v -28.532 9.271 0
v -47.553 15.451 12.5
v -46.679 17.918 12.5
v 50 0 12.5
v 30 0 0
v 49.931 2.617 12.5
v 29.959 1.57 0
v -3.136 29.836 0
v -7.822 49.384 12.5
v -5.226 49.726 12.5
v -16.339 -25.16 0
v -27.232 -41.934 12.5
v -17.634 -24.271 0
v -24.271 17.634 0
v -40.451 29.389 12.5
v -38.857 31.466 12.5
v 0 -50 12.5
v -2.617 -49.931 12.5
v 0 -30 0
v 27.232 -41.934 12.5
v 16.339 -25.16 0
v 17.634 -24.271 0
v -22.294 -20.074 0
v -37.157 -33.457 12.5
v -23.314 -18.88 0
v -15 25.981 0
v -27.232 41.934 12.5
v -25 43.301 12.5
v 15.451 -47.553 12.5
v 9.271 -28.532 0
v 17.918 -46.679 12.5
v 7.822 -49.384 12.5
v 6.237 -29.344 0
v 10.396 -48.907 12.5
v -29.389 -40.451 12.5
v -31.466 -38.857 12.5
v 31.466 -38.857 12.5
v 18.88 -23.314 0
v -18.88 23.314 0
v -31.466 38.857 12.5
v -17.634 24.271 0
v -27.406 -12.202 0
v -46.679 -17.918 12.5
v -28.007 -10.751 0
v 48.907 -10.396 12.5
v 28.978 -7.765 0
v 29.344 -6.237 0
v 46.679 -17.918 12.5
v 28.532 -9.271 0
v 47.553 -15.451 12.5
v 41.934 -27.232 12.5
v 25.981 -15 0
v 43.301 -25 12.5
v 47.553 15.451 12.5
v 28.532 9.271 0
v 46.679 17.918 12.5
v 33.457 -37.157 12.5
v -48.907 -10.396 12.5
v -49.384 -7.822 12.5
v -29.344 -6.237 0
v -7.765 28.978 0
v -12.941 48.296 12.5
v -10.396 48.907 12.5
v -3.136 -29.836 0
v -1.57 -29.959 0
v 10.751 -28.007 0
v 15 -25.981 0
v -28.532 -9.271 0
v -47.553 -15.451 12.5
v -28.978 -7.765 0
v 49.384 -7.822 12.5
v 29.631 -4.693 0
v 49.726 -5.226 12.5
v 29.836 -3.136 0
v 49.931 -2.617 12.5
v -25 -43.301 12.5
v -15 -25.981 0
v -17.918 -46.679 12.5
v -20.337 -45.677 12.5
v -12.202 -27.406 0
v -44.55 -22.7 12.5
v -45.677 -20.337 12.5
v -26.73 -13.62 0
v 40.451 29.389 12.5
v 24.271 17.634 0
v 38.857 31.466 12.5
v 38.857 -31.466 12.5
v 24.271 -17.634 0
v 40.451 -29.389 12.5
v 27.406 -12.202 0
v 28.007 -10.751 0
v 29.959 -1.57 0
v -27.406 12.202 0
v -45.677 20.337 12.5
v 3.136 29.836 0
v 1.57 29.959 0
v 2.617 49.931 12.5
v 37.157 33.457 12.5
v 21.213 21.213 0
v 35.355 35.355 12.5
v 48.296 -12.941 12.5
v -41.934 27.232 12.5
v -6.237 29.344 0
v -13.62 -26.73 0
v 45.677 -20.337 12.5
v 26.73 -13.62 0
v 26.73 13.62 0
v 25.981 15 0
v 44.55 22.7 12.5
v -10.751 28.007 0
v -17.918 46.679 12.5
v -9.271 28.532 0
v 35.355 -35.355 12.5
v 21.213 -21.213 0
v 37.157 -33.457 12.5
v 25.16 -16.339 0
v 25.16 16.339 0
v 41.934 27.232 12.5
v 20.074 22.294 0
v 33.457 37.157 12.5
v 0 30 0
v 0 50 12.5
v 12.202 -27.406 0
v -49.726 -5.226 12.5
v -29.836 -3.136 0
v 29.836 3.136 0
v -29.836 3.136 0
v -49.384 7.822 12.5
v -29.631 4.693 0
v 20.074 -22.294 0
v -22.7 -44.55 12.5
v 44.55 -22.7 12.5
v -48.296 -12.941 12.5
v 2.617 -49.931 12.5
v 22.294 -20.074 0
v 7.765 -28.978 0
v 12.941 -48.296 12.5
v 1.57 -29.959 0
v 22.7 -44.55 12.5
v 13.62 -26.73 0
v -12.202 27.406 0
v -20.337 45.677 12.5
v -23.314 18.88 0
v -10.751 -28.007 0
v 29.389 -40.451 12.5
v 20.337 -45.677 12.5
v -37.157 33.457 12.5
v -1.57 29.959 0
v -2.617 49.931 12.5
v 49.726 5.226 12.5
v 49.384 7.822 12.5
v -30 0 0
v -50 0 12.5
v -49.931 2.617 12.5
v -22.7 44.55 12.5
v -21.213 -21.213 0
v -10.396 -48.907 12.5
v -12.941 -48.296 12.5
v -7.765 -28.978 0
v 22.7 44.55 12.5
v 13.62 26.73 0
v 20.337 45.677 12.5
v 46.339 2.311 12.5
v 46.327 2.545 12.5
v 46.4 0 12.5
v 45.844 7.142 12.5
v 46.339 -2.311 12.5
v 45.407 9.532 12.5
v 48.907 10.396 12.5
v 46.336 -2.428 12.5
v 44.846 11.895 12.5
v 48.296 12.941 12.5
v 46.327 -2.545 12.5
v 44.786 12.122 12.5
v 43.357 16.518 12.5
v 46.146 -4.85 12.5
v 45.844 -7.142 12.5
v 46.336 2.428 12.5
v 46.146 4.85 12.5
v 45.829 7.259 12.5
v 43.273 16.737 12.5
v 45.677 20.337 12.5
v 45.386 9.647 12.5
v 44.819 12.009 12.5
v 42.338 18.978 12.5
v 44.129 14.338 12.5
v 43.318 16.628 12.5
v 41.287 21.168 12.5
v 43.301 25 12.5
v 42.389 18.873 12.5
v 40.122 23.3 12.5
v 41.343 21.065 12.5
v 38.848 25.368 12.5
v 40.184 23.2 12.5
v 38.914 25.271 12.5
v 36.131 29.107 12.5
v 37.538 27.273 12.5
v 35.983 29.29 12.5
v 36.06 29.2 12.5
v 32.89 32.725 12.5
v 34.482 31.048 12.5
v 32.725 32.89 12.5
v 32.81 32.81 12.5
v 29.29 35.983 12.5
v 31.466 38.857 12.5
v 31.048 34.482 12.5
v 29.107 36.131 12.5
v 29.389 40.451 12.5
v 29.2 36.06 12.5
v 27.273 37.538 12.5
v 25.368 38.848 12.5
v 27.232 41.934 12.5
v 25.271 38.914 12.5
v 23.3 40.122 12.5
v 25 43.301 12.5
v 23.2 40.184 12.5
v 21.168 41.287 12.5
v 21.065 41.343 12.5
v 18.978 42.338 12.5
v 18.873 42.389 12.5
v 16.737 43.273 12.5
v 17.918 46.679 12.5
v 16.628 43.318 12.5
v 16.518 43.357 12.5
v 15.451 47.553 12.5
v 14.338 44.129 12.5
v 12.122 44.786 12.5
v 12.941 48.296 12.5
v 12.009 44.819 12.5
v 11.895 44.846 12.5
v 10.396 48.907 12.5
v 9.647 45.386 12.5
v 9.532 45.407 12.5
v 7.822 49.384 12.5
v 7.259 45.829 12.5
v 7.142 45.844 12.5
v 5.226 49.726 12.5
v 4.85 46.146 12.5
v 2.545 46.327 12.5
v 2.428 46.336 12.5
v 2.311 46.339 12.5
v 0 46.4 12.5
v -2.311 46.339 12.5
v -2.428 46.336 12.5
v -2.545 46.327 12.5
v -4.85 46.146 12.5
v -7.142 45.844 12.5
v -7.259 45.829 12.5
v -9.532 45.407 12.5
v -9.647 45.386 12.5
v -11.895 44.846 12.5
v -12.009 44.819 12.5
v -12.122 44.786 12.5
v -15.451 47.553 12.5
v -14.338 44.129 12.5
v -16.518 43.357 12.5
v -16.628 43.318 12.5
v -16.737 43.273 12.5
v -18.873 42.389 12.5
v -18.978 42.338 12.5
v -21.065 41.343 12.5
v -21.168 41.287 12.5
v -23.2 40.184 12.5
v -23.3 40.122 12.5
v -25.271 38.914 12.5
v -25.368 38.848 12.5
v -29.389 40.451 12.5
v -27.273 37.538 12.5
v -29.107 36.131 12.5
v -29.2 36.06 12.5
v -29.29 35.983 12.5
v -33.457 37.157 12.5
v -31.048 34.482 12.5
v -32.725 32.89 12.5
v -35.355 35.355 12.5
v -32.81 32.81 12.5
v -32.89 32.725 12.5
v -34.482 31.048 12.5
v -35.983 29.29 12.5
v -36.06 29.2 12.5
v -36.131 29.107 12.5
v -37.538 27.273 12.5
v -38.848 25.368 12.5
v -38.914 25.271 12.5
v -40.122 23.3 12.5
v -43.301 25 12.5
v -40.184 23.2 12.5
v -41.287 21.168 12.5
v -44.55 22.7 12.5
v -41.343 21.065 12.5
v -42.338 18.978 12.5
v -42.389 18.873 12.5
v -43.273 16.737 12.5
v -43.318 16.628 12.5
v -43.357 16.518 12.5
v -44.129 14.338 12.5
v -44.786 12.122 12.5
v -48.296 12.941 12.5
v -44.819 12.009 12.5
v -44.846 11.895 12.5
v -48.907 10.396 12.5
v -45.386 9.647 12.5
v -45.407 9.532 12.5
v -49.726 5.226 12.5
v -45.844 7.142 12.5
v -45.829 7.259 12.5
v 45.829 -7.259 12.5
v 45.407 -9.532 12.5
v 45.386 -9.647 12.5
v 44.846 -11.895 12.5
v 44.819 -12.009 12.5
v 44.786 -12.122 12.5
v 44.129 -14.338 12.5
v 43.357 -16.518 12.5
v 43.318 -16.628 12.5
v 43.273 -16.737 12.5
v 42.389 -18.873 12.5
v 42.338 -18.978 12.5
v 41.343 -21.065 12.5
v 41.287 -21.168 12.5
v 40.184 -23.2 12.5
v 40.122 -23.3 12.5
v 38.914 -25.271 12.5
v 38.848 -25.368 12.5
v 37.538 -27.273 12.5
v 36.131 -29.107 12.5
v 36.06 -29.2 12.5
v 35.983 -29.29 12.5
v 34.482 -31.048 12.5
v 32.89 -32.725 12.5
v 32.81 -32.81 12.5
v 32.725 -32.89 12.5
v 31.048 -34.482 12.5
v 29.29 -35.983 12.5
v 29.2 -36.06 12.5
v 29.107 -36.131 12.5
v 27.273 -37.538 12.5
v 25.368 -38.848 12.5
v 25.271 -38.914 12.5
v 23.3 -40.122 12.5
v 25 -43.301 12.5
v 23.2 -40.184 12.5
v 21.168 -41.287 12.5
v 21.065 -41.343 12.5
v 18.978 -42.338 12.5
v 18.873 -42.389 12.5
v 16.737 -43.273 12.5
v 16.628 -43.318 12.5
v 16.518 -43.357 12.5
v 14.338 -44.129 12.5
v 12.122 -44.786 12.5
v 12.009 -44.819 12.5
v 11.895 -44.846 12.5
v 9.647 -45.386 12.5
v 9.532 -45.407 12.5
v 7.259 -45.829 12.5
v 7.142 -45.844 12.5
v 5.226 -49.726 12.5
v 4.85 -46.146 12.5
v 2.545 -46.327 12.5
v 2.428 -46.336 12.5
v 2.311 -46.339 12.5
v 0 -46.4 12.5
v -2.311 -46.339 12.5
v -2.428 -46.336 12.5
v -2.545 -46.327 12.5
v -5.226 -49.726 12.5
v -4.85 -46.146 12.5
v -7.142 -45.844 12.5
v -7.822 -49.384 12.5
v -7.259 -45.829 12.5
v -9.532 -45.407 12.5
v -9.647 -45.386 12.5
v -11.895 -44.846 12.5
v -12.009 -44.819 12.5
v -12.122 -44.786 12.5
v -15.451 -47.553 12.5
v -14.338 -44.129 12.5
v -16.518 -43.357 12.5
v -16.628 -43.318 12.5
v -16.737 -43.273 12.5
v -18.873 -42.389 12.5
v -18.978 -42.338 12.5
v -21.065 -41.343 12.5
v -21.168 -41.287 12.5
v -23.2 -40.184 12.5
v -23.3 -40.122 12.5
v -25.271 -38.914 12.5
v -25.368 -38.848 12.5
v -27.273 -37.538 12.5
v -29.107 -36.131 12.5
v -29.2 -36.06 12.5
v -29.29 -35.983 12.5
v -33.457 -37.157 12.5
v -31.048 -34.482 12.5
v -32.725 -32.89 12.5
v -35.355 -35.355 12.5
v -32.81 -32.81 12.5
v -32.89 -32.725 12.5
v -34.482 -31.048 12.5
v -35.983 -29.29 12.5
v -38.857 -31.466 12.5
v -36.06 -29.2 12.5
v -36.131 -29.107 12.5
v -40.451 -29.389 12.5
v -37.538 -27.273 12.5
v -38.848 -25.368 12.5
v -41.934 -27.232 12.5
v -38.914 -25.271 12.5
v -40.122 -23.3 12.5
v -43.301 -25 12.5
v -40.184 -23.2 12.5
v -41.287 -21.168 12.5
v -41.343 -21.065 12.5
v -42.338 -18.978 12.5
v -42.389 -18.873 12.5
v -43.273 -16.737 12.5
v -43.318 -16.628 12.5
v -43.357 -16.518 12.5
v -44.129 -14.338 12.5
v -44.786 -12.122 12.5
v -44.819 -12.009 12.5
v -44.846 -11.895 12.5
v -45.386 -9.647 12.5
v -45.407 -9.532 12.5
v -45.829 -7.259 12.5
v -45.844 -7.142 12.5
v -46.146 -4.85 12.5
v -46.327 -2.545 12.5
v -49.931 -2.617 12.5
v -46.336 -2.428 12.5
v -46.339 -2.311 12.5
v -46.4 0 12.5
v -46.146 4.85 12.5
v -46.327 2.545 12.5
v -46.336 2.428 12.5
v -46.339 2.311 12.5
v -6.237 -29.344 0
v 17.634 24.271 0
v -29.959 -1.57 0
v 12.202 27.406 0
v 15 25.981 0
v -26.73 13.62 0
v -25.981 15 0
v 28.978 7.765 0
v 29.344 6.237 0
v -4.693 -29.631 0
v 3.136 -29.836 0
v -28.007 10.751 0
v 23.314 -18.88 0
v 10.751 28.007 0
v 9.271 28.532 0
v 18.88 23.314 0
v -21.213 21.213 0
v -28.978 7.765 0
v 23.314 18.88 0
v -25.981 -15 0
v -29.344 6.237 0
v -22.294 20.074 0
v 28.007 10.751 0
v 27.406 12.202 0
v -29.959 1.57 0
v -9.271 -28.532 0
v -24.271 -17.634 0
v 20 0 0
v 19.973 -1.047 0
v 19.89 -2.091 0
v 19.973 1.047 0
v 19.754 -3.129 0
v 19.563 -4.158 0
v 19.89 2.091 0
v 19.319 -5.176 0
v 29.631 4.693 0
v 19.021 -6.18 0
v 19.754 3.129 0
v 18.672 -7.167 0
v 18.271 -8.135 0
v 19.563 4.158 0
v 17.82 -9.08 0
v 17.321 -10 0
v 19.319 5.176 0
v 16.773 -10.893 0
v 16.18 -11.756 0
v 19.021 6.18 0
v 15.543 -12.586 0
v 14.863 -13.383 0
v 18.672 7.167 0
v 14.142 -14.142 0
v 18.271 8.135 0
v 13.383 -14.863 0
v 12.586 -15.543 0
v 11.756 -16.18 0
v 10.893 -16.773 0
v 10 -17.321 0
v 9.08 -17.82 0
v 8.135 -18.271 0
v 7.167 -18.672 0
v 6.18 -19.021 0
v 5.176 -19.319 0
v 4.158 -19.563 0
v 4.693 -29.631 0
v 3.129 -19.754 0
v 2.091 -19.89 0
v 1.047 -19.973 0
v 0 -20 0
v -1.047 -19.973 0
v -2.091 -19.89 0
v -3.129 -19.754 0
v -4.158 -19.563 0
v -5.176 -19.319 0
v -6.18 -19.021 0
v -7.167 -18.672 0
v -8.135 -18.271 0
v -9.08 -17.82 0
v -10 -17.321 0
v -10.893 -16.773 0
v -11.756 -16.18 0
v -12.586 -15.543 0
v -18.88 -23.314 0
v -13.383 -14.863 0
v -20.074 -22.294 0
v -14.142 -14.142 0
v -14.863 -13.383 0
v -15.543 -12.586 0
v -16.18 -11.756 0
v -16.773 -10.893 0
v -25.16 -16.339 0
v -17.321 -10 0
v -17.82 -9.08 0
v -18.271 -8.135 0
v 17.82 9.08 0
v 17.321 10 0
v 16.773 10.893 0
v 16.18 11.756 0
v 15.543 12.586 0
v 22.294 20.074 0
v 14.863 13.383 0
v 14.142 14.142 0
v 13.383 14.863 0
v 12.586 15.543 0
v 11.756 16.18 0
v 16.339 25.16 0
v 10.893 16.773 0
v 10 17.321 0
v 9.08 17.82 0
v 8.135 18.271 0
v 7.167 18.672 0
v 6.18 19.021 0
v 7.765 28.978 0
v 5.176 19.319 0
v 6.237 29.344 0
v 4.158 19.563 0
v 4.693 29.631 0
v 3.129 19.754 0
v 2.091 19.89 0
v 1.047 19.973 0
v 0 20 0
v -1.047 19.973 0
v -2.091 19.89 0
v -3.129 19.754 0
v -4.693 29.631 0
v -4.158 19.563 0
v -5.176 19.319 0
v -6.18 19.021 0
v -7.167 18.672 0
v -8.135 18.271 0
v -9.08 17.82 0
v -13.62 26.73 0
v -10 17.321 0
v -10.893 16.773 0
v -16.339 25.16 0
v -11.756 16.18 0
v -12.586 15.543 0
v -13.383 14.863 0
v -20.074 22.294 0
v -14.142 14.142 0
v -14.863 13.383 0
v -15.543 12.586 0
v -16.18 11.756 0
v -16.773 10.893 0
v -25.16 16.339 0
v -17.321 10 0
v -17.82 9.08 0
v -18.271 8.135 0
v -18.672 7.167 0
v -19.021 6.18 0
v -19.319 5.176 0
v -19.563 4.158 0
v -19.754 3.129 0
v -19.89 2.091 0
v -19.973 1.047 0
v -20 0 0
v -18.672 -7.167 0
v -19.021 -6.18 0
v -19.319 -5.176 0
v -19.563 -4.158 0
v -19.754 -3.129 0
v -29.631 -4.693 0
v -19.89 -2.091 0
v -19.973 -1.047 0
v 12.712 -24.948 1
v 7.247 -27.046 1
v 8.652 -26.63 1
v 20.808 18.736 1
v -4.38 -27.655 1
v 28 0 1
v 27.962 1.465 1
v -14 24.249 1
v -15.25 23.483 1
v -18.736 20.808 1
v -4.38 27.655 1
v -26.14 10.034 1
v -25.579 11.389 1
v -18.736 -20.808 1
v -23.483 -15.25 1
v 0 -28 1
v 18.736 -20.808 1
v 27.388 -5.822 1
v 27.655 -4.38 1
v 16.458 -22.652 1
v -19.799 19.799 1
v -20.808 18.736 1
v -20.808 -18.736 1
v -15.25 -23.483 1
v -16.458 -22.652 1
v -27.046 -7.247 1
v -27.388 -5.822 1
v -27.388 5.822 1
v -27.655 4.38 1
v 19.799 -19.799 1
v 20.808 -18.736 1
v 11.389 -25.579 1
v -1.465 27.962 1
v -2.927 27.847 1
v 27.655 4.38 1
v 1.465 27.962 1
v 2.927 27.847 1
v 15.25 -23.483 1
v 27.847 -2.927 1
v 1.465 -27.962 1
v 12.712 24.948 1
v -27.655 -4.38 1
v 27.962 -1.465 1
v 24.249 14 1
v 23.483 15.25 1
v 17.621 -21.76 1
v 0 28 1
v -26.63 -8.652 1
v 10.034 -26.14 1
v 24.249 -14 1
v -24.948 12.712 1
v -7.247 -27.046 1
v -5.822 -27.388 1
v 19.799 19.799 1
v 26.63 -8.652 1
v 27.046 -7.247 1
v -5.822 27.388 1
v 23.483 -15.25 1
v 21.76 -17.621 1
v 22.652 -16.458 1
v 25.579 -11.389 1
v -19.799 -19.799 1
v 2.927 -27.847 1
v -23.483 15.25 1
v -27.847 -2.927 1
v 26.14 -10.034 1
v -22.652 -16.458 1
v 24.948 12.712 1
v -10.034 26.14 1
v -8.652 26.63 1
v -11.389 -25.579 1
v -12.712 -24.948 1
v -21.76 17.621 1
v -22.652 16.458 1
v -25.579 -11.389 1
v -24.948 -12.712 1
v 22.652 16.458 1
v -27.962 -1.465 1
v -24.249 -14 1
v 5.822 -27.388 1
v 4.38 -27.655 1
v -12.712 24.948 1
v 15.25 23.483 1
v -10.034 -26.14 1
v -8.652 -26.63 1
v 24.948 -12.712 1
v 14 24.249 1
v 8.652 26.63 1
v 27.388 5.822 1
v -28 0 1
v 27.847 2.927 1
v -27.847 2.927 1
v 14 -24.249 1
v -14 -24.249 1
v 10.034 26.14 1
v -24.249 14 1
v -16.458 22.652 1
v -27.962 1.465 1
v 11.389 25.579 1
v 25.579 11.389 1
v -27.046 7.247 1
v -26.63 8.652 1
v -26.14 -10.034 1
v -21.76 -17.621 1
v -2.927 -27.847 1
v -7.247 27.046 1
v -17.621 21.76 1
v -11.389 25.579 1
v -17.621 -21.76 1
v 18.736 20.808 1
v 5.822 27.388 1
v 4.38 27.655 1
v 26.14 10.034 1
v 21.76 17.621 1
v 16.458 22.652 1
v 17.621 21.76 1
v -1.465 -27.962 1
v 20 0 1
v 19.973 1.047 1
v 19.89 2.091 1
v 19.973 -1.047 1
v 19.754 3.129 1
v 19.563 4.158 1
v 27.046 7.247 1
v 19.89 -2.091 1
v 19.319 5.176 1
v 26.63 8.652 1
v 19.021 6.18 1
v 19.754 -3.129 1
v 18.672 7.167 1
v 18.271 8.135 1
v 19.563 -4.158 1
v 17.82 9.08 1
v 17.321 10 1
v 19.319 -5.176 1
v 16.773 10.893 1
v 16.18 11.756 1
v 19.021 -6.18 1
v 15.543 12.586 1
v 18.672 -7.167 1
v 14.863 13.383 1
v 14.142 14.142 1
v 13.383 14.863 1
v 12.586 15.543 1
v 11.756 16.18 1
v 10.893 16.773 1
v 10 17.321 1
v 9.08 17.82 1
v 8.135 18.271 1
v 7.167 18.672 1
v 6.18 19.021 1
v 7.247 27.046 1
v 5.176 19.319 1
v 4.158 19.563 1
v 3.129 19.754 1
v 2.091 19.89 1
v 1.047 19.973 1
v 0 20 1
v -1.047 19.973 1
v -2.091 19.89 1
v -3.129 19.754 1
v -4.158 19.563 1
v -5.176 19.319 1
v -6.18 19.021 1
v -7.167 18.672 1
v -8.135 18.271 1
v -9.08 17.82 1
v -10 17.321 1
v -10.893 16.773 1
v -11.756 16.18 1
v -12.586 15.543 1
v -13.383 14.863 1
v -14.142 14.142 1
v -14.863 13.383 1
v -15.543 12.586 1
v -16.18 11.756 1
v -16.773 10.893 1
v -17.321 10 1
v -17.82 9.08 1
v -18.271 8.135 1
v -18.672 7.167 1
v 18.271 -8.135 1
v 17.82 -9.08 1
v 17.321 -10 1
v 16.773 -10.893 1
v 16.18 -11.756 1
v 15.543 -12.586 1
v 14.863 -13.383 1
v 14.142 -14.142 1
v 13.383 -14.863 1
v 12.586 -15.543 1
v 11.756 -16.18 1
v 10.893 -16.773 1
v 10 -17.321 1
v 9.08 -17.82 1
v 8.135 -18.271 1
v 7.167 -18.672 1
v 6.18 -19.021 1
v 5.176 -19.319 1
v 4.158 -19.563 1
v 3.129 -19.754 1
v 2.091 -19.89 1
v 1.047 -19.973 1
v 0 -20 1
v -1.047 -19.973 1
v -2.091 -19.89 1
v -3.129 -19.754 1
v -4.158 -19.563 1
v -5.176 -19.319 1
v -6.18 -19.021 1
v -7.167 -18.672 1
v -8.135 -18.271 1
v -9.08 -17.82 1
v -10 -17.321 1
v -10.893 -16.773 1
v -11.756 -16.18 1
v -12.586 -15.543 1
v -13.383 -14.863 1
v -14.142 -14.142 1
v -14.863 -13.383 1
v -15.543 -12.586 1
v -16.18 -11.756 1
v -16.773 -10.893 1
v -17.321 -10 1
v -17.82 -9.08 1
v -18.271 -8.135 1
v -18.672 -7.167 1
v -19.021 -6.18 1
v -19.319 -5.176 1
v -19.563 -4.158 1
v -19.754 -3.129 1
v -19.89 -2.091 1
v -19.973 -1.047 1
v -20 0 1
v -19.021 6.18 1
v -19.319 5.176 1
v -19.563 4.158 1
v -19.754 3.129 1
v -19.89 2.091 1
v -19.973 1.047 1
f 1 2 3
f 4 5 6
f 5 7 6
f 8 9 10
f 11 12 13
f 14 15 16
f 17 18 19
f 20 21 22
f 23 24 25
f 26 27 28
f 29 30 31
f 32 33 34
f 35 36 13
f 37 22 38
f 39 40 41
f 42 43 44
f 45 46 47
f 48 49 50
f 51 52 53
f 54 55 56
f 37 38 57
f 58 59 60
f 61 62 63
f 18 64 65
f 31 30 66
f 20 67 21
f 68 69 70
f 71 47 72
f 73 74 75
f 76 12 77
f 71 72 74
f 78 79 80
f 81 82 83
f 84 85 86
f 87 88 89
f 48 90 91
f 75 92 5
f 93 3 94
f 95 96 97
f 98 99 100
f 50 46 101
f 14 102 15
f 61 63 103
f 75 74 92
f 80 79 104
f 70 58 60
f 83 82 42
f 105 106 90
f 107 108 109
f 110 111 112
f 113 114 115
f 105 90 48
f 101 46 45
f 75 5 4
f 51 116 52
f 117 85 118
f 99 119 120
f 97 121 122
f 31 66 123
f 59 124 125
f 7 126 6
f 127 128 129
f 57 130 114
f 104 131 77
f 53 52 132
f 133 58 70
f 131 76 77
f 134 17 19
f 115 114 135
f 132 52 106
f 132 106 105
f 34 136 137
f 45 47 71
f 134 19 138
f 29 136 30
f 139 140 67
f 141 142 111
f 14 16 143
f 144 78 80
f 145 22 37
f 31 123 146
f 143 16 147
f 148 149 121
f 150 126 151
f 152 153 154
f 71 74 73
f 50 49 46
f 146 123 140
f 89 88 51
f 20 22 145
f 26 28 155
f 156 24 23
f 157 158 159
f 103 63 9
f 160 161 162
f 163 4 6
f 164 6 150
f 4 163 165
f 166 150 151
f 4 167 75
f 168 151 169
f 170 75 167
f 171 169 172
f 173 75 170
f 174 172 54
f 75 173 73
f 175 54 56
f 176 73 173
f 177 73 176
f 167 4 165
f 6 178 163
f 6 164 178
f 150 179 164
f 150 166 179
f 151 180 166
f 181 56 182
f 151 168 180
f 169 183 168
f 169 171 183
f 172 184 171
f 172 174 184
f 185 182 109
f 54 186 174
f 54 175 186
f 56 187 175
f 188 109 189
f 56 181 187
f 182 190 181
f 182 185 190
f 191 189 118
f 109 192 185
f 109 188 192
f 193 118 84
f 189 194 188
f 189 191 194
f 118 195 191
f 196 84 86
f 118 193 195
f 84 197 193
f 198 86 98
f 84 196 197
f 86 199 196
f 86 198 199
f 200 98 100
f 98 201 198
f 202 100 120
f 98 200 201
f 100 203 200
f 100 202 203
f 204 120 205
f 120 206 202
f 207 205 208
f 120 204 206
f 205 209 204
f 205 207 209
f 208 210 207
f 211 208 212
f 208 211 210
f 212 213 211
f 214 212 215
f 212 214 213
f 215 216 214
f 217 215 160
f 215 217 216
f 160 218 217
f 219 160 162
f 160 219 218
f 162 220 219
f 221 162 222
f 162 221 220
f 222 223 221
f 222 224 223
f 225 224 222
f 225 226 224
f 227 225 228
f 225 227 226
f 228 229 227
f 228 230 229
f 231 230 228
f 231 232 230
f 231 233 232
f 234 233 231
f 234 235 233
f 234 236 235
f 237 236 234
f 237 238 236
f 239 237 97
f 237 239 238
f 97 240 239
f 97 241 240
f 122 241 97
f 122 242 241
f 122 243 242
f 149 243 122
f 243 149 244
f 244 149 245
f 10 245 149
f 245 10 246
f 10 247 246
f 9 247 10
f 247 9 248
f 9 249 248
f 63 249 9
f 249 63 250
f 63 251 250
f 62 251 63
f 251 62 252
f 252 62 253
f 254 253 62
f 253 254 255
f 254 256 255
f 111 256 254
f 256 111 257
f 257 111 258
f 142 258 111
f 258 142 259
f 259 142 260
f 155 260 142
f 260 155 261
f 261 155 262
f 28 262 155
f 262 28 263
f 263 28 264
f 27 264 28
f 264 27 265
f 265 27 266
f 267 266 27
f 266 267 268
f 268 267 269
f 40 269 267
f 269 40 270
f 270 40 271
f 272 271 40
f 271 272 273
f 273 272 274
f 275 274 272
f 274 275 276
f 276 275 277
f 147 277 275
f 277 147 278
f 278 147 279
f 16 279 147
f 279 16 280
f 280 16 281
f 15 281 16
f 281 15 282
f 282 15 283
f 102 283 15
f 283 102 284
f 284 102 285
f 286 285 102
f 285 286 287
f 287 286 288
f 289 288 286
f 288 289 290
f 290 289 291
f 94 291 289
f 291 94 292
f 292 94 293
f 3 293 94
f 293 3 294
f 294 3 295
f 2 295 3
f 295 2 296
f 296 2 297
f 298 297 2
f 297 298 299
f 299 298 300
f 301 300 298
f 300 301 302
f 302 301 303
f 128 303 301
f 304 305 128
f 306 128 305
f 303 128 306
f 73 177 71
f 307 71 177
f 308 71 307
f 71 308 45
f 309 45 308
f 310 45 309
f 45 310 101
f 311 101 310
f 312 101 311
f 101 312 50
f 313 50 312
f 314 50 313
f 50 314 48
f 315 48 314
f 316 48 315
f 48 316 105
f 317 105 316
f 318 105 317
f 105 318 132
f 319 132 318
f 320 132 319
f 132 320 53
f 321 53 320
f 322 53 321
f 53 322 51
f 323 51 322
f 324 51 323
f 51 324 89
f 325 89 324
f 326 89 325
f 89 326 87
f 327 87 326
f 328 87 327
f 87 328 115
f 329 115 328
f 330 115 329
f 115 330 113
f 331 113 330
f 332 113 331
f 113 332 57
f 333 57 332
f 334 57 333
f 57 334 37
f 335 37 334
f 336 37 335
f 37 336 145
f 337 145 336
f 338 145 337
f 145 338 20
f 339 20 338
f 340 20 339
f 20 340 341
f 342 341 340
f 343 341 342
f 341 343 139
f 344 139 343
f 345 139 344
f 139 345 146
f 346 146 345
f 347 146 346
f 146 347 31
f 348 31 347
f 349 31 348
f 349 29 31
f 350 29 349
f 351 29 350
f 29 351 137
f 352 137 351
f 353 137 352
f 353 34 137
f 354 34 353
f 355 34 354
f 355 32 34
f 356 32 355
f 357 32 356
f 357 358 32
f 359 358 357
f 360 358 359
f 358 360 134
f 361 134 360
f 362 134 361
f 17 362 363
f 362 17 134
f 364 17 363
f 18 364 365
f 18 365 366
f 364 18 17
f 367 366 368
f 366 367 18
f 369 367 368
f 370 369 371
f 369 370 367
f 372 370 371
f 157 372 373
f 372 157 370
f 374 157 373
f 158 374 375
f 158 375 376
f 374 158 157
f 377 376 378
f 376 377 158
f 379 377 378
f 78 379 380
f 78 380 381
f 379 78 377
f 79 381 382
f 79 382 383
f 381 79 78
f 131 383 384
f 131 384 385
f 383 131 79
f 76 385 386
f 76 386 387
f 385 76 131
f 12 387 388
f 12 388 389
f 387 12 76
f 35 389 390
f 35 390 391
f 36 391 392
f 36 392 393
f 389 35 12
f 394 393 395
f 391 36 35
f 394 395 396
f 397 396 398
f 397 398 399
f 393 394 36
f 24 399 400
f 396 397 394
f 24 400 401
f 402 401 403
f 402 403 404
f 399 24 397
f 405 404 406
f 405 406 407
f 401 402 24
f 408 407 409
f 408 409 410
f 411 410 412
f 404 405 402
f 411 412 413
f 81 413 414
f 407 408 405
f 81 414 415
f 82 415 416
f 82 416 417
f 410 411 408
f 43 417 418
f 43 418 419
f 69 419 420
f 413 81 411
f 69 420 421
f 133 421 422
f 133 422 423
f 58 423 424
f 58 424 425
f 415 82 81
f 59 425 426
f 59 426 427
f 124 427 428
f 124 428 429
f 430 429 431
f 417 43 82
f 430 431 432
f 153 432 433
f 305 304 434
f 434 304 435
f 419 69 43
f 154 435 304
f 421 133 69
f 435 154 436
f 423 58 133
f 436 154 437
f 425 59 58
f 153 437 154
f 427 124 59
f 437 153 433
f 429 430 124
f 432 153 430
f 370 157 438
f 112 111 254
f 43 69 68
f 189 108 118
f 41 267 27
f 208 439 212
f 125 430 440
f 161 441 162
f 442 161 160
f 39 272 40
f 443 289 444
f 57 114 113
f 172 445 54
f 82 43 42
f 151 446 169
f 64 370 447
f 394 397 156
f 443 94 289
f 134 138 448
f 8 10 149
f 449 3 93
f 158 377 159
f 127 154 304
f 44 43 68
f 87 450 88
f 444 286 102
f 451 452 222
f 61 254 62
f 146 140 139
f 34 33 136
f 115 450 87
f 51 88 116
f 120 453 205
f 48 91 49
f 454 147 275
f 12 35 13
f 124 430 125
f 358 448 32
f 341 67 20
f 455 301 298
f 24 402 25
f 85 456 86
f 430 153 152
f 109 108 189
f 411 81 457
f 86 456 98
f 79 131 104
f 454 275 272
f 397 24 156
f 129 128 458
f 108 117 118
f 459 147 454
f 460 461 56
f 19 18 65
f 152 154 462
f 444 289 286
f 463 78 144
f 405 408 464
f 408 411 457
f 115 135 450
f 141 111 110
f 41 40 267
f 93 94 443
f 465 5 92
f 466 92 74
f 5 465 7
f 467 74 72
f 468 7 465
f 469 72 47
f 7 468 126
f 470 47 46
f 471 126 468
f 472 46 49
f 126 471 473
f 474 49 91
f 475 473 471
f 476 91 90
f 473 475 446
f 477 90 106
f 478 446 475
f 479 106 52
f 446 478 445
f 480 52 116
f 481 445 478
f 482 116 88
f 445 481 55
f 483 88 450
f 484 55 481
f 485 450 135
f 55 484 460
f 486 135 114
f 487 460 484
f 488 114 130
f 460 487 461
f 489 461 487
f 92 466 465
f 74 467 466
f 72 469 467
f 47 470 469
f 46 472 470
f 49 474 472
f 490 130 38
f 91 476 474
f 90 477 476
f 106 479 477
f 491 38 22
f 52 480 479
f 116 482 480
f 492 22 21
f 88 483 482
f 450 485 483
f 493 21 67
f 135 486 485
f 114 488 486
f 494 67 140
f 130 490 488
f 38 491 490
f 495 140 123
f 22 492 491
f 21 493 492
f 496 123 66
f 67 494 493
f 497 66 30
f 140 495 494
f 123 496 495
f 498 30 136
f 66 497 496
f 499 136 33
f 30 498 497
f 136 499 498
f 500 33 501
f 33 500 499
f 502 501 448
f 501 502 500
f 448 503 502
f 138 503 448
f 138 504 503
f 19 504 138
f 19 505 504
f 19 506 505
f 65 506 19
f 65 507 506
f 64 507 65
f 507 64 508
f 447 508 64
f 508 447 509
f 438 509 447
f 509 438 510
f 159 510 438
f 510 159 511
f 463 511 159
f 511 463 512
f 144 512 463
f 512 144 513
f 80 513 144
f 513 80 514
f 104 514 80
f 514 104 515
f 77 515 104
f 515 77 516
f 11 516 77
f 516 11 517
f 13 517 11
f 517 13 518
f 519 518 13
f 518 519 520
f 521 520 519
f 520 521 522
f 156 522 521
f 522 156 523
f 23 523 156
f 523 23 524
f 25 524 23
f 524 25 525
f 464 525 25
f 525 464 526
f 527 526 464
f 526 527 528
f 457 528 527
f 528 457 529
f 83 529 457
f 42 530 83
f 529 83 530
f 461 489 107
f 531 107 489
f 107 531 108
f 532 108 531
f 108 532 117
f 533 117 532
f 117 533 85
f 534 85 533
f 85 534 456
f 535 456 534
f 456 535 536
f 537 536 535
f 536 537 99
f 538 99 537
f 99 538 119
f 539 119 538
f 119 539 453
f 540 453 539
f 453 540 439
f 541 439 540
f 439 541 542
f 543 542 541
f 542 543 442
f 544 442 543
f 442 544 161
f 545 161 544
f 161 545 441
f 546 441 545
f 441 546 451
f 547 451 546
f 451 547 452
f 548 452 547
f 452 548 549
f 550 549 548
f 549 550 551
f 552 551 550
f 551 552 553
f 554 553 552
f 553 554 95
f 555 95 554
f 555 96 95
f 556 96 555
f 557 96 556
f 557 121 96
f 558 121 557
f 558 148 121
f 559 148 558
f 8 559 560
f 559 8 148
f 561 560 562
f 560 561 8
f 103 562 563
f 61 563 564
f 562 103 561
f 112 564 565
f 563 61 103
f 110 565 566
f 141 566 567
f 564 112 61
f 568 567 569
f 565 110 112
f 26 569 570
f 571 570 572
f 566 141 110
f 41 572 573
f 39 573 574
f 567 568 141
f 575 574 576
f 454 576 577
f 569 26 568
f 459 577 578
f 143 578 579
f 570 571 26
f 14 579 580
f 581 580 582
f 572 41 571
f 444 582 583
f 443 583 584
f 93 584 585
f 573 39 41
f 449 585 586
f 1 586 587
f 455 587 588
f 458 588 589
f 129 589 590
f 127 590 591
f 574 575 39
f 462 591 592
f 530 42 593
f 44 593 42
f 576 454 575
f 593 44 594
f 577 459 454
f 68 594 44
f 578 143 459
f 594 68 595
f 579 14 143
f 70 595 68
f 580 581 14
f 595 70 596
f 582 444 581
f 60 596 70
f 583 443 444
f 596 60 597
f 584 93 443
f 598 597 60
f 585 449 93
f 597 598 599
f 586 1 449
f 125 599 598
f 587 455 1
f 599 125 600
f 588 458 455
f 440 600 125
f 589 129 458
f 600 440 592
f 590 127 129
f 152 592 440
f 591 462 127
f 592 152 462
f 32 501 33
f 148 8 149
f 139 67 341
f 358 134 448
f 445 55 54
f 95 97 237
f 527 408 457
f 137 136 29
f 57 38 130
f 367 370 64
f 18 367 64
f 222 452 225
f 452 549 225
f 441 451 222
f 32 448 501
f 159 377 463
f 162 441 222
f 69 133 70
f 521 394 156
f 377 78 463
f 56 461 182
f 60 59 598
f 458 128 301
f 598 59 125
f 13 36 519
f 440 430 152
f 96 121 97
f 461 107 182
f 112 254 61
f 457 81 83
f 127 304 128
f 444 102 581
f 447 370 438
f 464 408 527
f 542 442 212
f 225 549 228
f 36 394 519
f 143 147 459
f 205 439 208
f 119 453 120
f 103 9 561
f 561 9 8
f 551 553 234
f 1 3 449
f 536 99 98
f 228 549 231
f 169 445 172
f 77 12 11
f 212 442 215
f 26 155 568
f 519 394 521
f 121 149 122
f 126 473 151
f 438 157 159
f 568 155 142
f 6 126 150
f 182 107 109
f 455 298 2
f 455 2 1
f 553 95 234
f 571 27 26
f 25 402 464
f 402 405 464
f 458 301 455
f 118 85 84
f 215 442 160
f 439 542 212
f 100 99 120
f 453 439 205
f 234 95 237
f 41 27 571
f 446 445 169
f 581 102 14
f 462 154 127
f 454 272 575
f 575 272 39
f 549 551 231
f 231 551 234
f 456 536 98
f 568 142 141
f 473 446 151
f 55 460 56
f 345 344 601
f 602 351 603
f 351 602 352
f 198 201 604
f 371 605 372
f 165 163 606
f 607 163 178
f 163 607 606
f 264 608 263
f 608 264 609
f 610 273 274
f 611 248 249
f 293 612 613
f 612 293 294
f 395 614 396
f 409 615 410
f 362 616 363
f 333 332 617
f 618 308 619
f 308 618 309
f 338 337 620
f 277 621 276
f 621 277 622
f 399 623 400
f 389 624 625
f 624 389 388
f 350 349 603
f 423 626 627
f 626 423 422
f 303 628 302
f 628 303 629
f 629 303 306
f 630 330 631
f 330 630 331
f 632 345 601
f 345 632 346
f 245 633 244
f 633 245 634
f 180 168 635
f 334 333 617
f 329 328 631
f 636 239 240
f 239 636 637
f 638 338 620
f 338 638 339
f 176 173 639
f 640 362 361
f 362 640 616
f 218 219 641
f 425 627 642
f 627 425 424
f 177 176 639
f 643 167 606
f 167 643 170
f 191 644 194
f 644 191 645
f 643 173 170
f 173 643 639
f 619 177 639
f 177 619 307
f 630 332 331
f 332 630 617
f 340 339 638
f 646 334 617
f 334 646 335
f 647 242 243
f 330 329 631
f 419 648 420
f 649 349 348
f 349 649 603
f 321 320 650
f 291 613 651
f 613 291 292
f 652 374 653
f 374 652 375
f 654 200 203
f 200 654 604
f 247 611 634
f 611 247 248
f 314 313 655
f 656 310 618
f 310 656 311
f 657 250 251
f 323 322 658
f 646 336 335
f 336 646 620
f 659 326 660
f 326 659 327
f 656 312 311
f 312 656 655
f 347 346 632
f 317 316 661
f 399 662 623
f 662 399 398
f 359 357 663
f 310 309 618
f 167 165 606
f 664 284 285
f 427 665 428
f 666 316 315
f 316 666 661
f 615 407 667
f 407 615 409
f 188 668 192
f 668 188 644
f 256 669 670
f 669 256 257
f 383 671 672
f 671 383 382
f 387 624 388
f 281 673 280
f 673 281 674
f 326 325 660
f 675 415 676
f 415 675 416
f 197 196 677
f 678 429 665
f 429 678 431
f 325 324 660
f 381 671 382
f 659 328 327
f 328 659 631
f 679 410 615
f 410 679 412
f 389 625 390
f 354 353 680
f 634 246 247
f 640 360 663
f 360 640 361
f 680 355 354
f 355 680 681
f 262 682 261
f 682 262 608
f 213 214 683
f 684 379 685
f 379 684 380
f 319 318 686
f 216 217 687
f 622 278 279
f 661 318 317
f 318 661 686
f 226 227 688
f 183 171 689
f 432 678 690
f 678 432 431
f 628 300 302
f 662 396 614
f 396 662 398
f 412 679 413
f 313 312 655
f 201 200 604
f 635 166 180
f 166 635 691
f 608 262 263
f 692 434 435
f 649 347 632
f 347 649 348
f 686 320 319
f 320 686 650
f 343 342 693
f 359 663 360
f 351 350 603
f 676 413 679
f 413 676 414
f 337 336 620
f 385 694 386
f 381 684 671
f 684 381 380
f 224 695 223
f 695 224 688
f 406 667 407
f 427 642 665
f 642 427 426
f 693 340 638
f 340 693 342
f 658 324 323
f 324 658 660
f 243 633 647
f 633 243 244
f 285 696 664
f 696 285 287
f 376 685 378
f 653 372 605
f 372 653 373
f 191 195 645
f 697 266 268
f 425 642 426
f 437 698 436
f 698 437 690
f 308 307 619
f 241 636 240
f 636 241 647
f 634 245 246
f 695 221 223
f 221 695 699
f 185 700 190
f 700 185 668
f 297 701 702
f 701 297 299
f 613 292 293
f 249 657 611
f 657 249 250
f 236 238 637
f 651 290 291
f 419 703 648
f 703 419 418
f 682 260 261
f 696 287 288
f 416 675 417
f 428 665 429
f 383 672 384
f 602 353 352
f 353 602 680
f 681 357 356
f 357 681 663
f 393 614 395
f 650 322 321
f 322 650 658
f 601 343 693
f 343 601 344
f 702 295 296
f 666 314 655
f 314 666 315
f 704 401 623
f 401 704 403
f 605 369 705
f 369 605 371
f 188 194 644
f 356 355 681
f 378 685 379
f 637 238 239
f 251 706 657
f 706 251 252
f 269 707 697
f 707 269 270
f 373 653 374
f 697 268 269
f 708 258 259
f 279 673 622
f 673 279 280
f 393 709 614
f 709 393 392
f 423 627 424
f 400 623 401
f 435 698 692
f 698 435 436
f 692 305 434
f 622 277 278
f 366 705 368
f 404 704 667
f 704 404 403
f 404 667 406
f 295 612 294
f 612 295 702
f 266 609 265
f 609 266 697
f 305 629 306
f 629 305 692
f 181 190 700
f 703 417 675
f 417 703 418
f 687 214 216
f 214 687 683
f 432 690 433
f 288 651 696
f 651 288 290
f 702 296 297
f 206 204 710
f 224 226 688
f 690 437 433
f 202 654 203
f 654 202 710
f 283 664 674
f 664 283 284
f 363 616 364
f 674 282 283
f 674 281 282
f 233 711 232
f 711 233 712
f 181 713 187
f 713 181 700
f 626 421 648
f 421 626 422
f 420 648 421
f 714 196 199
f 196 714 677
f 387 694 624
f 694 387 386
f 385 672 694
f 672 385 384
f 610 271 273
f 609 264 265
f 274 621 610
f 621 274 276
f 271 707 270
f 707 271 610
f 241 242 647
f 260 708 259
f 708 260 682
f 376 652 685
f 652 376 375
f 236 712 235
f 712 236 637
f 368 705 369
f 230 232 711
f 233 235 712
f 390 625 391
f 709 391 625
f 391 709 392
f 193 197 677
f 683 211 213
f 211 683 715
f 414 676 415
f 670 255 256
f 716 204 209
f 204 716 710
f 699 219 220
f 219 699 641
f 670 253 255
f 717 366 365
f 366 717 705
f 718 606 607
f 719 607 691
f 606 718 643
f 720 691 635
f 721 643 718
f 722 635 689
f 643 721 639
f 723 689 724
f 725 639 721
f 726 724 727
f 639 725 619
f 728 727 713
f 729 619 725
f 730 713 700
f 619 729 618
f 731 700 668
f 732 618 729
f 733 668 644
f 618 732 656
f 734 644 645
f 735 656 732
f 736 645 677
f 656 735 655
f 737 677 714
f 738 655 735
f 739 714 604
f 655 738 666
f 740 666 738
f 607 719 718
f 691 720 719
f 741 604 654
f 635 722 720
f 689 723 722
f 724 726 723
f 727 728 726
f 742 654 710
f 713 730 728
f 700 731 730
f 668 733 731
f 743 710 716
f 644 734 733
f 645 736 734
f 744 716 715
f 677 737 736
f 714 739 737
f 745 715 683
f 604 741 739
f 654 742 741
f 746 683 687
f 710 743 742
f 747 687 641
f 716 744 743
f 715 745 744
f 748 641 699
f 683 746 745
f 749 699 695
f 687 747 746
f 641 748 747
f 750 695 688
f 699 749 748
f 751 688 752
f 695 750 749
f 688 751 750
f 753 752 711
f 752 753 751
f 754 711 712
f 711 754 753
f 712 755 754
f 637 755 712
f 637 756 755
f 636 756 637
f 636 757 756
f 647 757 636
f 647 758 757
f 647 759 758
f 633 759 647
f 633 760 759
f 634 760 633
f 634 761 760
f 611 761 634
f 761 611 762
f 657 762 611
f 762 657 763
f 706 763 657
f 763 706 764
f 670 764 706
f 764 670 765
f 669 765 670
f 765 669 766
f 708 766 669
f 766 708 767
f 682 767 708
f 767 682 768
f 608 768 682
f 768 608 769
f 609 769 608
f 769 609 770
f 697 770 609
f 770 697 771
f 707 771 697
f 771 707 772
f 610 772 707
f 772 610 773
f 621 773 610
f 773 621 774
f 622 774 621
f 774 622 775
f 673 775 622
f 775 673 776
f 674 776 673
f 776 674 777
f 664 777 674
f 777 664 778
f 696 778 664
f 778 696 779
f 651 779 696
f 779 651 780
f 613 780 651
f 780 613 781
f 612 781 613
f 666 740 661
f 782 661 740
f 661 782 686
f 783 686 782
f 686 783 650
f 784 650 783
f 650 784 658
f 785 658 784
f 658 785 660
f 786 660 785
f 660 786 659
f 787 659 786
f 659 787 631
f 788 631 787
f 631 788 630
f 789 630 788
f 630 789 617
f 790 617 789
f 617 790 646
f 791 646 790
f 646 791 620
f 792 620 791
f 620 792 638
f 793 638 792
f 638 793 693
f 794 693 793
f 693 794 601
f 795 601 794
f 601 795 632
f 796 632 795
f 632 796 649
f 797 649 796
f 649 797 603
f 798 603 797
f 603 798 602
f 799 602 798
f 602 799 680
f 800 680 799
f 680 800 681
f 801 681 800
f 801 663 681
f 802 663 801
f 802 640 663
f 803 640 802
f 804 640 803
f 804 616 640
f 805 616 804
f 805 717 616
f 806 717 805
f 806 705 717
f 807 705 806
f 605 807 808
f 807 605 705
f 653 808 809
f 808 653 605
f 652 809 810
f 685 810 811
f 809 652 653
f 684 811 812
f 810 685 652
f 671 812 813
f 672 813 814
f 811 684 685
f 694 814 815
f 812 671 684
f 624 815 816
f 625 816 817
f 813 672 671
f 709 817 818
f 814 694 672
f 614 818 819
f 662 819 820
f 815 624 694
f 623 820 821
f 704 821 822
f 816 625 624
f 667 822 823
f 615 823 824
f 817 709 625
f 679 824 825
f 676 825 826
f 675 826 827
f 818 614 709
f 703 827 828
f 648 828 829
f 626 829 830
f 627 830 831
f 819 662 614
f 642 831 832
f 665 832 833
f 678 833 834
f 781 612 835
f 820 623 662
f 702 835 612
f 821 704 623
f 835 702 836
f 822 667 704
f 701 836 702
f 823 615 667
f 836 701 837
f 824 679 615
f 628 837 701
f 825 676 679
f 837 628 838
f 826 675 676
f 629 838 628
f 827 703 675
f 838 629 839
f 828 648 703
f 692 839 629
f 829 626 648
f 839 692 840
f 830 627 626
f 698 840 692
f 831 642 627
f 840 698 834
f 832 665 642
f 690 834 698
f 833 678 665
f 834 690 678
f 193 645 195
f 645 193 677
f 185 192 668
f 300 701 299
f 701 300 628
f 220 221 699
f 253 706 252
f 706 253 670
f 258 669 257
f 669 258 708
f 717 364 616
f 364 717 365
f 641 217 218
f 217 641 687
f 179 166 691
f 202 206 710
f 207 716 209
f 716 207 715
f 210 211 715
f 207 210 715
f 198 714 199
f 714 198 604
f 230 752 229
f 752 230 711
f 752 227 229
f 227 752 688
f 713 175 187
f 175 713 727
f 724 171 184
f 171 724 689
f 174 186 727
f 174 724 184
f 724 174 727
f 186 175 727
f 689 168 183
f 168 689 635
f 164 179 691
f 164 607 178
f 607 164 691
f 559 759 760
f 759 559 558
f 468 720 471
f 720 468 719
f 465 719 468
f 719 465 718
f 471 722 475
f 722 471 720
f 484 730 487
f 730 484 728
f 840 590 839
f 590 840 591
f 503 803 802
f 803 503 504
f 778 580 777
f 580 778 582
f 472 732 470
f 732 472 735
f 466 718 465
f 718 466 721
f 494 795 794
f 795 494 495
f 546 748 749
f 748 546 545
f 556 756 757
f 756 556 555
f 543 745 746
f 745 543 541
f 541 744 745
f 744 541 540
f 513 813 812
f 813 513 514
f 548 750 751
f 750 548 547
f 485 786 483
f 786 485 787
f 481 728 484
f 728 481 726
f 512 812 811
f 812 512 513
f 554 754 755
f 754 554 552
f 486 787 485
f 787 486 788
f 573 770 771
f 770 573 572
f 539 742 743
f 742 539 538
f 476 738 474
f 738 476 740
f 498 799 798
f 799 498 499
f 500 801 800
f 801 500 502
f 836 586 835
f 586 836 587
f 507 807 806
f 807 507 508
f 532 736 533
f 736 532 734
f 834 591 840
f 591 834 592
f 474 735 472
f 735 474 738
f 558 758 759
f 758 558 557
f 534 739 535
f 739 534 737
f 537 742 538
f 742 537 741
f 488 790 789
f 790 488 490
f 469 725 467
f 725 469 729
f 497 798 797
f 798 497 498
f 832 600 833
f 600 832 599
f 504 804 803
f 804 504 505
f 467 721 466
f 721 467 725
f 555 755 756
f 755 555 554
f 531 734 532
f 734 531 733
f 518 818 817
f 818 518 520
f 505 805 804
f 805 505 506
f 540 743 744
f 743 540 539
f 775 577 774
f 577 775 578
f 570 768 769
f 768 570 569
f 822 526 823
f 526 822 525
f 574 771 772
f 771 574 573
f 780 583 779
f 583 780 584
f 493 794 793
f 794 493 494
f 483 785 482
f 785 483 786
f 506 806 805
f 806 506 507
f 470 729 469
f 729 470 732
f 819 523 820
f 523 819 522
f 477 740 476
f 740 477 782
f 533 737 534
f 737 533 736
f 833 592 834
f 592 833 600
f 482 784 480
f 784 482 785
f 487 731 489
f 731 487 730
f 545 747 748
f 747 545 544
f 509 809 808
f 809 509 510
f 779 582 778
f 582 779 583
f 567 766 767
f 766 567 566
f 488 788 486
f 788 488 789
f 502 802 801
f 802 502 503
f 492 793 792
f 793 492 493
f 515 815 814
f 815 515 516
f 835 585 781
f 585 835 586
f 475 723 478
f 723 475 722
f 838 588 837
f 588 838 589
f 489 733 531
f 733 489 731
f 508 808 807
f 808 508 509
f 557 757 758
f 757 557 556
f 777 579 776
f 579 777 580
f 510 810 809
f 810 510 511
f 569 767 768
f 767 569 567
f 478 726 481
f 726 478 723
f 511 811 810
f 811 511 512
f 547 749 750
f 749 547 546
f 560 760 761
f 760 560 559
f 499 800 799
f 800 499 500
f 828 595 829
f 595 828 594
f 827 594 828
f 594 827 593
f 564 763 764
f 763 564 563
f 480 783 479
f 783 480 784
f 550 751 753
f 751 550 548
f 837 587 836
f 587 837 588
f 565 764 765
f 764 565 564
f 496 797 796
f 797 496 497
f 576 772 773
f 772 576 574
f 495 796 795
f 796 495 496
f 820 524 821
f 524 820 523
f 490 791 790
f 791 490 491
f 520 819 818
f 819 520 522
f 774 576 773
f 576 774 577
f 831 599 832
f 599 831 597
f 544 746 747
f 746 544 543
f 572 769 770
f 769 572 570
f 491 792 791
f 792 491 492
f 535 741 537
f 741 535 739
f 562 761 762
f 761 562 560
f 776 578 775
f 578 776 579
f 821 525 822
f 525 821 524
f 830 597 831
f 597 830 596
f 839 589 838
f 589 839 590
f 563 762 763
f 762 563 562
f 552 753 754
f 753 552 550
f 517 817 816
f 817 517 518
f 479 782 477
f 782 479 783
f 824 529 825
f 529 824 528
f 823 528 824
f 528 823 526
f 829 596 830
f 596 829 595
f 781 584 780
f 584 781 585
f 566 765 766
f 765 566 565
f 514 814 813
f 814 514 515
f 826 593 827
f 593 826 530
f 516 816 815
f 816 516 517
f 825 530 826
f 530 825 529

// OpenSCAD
$fn=120;

size = 50;
scale_factor = .6;

difference() {
    cylinder(h = size/4, r1 = size*scale_factor, r2 = size);
    translate([0,0,1]) cylinder(h = size/4, r1 = size*scale_factor-2, r2 = size-2);
    translate([0,0,-1]) cylinder(h = size/4+1, r = size*scale_factor-10);
}
